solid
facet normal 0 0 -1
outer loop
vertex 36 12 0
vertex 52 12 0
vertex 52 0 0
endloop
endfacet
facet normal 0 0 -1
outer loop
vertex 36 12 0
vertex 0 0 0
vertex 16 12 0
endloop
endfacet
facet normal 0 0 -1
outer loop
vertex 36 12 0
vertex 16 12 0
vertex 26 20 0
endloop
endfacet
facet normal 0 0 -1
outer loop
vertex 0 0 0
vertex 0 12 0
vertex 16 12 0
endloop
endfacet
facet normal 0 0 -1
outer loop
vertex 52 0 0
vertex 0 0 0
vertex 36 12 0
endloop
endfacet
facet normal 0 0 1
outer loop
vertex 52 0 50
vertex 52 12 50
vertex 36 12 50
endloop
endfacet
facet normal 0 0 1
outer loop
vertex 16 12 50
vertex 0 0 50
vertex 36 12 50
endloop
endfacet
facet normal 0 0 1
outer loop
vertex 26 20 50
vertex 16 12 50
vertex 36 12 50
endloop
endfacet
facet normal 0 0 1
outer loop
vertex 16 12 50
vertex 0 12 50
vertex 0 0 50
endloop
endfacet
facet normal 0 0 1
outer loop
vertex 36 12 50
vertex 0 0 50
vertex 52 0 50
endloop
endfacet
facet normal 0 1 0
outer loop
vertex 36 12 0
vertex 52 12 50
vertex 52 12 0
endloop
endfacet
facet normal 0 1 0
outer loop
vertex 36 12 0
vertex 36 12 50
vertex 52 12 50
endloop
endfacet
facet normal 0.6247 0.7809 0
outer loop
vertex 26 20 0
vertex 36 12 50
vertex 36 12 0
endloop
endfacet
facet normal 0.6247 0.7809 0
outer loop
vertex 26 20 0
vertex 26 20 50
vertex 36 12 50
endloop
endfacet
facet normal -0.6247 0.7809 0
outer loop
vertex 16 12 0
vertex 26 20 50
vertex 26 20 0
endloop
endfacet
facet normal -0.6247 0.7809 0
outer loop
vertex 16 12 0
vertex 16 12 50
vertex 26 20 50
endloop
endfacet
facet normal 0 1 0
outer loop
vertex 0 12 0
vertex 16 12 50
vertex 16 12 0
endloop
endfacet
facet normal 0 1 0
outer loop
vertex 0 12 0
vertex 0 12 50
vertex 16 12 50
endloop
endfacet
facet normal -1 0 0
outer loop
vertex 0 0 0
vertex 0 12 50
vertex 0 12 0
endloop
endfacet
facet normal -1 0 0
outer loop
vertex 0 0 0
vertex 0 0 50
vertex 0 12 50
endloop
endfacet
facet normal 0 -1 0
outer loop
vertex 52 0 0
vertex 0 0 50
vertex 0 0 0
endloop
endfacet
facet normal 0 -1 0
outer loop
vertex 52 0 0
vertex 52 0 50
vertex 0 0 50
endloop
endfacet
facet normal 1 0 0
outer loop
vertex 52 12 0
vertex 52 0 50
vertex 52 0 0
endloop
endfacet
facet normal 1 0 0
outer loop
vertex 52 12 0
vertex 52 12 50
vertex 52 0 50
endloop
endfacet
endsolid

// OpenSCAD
$fn = 32;

// ----------------------------------------------------------------------
// V guide rail: vrib, 52 mm wide
// ----------------------------------------------------------------------

// --- parameters (mm) ---
rail_w = 52;              // rail width, X
base_t = 12;              // base plate thickness
v_depth = 8;              // V feature depth / height
v_half_w = 10;            // half width of the V at the base face
plate_t = 50;             // rail length, Z (the extrusion height)

profile = [[0, 0], [52, 0], [52, 12], [36, 12], [26, 20], [16, 12], [0, 12]];  // primary outline, 7 points, counter clockwise

// --- the one profile operation ---
linear_extrude(height = plate_t) polygon(points = profile);
